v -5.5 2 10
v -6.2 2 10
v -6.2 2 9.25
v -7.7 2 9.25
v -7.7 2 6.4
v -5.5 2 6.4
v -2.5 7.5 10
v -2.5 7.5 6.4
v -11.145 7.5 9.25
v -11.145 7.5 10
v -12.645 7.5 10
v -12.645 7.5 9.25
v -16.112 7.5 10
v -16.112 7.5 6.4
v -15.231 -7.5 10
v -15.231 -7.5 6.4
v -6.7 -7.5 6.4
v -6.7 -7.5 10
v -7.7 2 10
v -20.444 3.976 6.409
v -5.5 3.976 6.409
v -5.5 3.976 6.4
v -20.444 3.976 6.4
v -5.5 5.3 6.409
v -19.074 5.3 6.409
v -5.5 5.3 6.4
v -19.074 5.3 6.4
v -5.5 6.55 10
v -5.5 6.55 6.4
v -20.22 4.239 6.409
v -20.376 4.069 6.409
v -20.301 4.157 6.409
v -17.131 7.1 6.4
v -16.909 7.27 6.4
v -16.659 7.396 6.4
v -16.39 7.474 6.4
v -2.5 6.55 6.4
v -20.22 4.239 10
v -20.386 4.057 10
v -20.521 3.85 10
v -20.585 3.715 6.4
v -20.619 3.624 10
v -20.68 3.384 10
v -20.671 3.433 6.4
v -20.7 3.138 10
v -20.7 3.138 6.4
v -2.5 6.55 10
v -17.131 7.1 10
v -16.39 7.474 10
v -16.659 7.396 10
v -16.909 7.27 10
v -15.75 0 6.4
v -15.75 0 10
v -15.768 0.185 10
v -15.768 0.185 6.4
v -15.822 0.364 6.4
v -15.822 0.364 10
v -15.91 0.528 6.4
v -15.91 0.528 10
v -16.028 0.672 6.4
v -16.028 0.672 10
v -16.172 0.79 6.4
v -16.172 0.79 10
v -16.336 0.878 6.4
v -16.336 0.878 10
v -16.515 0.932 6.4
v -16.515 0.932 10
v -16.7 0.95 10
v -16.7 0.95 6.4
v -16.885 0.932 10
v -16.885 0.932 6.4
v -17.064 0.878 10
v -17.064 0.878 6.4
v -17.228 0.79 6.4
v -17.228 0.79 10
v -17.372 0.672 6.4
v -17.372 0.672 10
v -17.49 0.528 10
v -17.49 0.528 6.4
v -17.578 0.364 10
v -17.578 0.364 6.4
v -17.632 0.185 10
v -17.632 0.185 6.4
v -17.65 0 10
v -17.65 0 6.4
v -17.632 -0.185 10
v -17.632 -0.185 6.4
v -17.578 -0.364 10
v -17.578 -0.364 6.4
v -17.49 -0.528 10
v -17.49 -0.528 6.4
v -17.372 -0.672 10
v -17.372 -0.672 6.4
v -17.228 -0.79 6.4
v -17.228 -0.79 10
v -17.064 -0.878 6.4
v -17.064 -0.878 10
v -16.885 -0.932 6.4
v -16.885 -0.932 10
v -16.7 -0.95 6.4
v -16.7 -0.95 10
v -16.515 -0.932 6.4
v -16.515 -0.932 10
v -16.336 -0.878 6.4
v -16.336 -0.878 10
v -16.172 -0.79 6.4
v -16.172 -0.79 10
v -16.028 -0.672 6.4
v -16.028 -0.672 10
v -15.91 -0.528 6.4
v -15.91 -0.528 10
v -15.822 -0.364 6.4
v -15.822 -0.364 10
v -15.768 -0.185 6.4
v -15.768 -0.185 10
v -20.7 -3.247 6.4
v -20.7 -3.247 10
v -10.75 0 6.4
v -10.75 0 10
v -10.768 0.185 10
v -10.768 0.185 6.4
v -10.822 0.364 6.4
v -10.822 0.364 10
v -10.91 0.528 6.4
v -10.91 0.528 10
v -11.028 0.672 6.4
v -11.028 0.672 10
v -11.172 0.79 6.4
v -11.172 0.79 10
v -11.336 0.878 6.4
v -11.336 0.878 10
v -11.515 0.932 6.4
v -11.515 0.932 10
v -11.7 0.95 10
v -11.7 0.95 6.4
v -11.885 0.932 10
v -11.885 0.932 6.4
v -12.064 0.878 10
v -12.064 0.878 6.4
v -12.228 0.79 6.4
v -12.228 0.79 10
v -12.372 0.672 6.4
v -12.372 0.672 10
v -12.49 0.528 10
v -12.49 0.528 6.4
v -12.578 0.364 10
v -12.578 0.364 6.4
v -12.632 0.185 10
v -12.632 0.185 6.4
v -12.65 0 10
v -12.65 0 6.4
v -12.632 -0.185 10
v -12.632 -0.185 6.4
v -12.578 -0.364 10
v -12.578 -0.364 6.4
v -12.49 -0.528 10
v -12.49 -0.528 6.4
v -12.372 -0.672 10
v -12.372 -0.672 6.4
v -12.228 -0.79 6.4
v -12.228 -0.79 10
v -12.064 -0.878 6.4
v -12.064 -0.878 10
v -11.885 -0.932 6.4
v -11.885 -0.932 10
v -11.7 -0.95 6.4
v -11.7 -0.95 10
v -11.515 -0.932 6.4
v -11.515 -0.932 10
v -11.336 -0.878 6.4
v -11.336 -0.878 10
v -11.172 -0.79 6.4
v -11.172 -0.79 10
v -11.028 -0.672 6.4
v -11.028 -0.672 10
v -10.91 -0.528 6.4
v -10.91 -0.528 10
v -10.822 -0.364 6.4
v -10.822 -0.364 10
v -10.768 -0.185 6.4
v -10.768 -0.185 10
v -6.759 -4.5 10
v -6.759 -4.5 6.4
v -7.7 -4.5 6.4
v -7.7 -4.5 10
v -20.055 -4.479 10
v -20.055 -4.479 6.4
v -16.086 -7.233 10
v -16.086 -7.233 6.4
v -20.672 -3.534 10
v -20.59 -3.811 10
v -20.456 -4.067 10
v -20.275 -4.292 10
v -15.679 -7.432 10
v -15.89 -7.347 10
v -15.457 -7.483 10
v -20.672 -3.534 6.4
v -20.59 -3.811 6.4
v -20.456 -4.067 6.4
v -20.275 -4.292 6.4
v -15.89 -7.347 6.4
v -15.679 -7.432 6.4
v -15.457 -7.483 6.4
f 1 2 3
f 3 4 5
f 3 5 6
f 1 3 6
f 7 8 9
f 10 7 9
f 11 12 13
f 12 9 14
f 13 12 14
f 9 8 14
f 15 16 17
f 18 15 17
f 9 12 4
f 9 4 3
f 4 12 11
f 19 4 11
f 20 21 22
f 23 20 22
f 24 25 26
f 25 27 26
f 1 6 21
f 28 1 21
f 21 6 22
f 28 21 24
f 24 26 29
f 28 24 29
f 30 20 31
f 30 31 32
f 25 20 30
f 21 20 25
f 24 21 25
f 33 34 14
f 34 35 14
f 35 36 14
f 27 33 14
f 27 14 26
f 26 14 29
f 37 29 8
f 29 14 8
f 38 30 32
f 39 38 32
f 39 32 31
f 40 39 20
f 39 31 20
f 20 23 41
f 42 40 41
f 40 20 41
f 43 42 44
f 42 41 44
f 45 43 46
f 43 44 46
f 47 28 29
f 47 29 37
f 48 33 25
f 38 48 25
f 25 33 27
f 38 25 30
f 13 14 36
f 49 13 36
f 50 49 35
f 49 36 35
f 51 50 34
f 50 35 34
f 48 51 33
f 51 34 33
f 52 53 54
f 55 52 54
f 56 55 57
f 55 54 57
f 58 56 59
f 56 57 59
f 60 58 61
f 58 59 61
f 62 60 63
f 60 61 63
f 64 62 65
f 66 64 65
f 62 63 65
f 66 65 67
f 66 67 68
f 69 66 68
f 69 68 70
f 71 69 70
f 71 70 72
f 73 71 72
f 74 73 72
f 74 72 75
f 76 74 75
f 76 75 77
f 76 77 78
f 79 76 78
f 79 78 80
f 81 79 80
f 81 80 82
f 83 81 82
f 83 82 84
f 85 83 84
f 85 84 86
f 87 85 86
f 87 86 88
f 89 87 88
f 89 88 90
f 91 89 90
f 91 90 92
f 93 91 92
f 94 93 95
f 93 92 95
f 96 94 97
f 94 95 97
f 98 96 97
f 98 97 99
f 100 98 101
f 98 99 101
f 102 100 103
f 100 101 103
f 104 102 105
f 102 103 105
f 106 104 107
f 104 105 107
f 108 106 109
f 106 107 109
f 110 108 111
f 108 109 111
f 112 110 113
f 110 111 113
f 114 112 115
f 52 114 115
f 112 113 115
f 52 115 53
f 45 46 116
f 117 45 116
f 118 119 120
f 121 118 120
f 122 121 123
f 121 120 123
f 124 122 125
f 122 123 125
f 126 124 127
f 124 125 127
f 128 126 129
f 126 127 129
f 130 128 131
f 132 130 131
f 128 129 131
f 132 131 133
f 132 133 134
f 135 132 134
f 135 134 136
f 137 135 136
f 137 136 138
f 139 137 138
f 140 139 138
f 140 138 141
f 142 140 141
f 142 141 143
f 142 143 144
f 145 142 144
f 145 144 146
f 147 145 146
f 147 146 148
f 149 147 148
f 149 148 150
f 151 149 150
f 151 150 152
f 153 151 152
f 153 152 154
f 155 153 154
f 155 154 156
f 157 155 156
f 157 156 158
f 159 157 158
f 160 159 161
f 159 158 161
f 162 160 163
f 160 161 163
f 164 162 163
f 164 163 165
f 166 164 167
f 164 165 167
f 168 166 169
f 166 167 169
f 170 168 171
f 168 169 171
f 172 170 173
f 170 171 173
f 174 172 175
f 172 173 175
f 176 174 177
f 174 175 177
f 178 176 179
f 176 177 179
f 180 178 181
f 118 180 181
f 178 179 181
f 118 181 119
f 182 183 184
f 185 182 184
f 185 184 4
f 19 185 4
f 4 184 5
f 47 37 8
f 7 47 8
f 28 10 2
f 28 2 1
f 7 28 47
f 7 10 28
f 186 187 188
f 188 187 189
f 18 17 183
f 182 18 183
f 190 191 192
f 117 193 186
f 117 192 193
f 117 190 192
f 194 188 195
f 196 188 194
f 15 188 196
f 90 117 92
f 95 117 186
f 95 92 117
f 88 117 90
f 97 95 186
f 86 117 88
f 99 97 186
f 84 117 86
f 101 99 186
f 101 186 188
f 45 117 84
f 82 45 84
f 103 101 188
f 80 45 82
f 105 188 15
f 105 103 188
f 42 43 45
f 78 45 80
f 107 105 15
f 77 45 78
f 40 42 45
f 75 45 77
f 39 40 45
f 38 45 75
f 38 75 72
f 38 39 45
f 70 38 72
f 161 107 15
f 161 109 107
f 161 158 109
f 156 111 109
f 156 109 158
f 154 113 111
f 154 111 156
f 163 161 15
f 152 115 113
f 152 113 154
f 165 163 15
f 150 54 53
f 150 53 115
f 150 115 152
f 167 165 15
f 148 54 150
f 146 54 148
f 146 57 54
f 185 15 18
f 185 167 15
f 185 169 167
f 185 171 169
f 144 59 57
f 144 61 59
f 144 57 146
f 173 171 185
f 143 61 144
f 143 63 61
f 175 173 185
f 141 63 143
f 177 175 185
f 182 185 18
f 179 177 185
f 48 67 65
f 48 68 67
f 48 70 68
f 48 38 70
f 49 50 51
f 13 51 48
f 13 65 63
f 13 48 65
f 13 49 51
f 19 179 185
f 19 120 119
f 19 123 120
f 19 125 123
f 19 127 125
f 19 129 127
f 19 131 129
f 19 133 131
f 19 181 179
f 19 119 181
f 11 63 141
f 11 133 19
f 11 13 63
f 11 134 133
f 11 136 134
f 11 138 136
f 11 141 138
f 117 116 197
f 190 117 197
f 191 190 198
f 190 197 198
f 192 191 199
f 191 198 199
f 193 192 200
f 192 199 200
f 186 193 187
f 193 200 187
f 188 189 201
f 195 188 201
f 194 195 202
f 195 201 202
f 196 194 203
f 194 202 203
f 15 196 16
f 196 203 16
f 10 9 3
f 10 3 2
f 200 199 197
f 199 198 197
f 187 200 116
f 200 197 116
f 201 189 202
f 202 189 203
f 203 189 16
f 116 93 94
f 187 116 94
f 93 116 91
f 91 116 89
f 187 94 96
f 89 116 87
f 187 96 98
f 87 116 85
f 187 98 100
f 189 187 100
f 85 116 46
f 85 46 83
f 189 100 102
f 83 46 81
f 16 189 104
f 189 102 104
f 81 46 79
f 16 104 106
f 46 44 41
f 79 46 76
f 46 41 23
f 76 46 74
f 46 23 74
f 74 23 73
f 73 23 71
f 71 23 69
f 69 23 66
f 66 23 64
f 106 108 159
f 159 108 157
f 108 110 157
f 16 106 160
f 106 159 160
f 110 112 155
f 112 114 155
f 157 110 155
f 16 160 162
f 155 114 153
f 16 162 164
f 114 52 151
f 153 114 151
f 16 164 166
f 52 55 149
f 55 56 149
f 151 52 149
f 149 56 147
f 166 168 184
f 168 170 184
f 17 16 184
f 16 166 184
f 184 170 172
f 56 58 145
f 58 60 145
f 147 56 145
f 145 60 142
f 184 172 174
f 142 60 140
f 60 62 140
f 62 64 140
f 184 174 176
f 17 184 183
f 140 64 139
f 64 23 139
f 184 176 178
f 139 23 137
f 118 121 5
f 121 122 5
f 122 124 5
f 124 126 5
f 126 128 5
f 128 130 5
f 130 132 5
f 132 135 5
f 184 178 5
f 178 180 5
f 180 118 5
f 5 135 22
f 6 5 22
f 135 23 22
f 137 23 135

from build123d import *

# Parameters (mm, degrees)
BOSS_EXTRUDE1_DEPTH = 2
BOSS_EXTRUDE2_DEPTH = 8
SKETCH24_R          = 3.9
BOSS_EXTRUDE5_DEPTH = 4.4
SKETCH30_W          = 4.40861202
SKETCH30_H          = 1.324178481
CUT_EXTRUDE12_DEPTH = 16
CUT_EXTRUDE11_DEPTH = 23.928148639
FILLET1_R           = 1.5
SKETCH34_W          = 1.5
SKETCH34_H          = 1.5
CUT_EXTRUDE13_DEPTH = 8
SKETCH36_R          = 0.95
CUT_EXTRUDE15_DEPTH = 8
SKETCH37_R          = 2
CUT_EXTRUDE16_DEPTH = 4.5
SKETCH38_W          = 3
SKETCH38_H          = 1.25
CUT_EXTRUDE17_DEPTH = 3.6


with BuildPart() as part:
    # Sketch2 → Boss-Extrude1 (new body)
    with BuildSketch(Plane.XY):
        with BuildLine():
            Line((-2.5, 7.5), (-16.7, 7.5))
            Line((-16.7, 7.5), (-20.7, 3.793442666))
            Line((-20.7, 3.793442666), (-20.7, -4.031648778))
            Line((-20.7, -4.031648778), (-15.7, -7.5))
            Line((-15.7, -7.5), (-6.7, -7.5))
            Line((-6.7, -7.5), (-4.2, -5.6))
            ThreePointArc((-4.2, -5.6), (3.130495168, -6.260990337), (7, 0))
            ThreePointArc((7, 0), (4.949747468, 4.949747468), (0, 7))
            Line((0, 7), (0, 7.5))
            Line((0, 7.5), (-2.5, 7.5))
        make_face()
    extrude(amount=BOSS_EXTRUDE1_DEPTH)

    # Sketch4 → Boss-Extrude2 (add)
    with BuildSketch(Plane.XY.offset(2)):
        Polygon((-15.7, -7.5), (-6.7, -7.5), (-6.759079174, -4.5), (-7.7, -4.5), (-7.7, 2), (-5.5, 2), (-5.5, 5.3), (-2.5, 5.3), (-2.5, 7.5), (-16.7, 7.5), (-20.7, 3.793442666), (-20.7, -4.031648778), align=None)
    extrude(amount=BOSS_EXTRUDE2_DEPTH)

    # Sketch24 → Boss-Extrude5 (add)
    with BuildSketch(Plane.XY.offset(2)):
        Circle(SKETCH24_R)
    extrude(amount=BOSS_EXTRUDE5_DEPTH)

    # Sketch30 → Cut-Extrude12 (cut)
    with BuildSketch(Plane(origin=(-5.5, 0, 0), x_dir=(0, 0, -1), z_dir=(1, 0, 0))):
        with Locations((-4.20430601, 4.63791076)):
            Rectangle(SKETCH30_W, SKETCH30_H)
    extrude(amount=-CUT_EXTRUDE12_DEPTH, mode=Mode.SUBTRACT)

    # Sketch28 → Cut-Extrude11 (cut, through all)
    with BuildSketch(Plane.XY.offset(6.4)):
        with BuildLine():
            Line((-1, 0.979795897), (-1, -0.979795897))
            ThreePointArc((-1, -0.979795897), (1.4, 0), (-1, 0.979795897))
        make_face()
    extrude(amount=-CUT_EXTRUDE11_DEPTH, mode=Mode.SUBTRACT)

    # Fillet1
    # the kernel refuses this fillet: 1.5 mm, written as the material it takes off along each edge
    with BuildSketch(Plane(origin=(-15.230677435, -6, 1.5), x_dir=(-0.5699665637840448, -0.8216678867816415, 0), z_dir=(0, 0, -1))) as fillet1_piece_1_section:
        Polygon((0, 0), (FILLET1_R * 1.02, 0), (FILLET1_R * 1.02, -FILLET1_R * 0.319139344377), (FILLET1_R * 0.838101244517, -FILLET1_R * 0.58136589506), align=None)
    fillet1_piece_1 = extrude(amount=FILLET1_R * 1.02, mode=Mode.PRIVATE)
    fillet1_piece_1 = fillet1_piece_1 - Plane(origin=(-15.230677435, -6, 1.5), x_dir=(0.29860685961507855, 0.9543762064253388, 0), z_dir=(0, 0, -1)) * Sphere(FILLET1_R, mode=Mode.PRIVATE)
    add(fillet1_piece_1, mode=Mode.SUBTRACT)
    with BuildSketch(Plane(origin=(-16.11186344, 6, 1.5), x_dir=(-0.6796897201843015, 0.7334997506991983, 0), z_dir=(0, 0, -1))) as fillet1_piece_2_section:
        Polygon((0, 0), (FILLET1_R * 1.02, 0), (FILLET1_R * 1.02, FILLET1_R * 0.399932860855), (FILLET1_R * 0.748169745713, FILLET1_R * 0.693283514588), align=None)
    fillet1_piece_2 = extrude(amount=FILLET1_R * 1.02, mode=Mode.PRIVATE)
    fillet1_piece_2 = fillet1_piece_2 - Plane(origin=(-16.11186344, 6, 1.5), x_dir=(0.3650344157067945, -0.9309940254102596, 0), z_dir=(0, 0, -1)) * Sphere(FILLET1_R, mode=Mode.PRIVATE)
    add(fillet1_piece_2, mode=Mode.SUBTRACT)
    with BuildSketch(Plane(origin=(-19.2, 3.138411196, 1.5), x_dir=(-0.6796897201843015, 0.7334997506991983, 0), z_dir=(0, 0, -1))) as fillet1_piece_3_section:
        Polygon((0, 0), (FILLET1_R * 1.02, 0), (FILLET1_R * 1.02, -FILLET1_R * 0.445421399395), (FILLET1_R * 0.693283514588, -FILLET1_R * 0.748169745713), align=None)
    fillet1_piece_3 = extrude(amount=FILLET1_R * 1.02, mode=Mode.PRIVATE)
    fillet1_piece_3 = fillet1_piece_3 - Plane(origin=(-19.2, 3.138411196, 1.5), x_dir=(0.9164304993244992, -0.40019387789901173, 0), z_dir=(0, 0, -1)) * Sphere(FILLET1_R, mode=Mode.PRIVATE)
    add(fillet1_piece_3, mode=Mode.SUBTRACT)
    with BuildSketch(Plane(origin=(-19.2, -3.246599046, 1.5), x_dir=(-0.5699665637840448, -0.8216678867816415, 0), z_dir=(0, 0, -1))) as fillet1_piece_4_section:
        Polygon((0, 0), (FILLET1_R * 1.02, 0), (FILLET1_R * 1.02, FILLET1_R * 0.533833817771), (FILLET1_R * 0.58136589506, FILLET1_R * 0.838101244517), align=None)
    fillet1_piece_4 = extrude(amount=FILLET1_R * 1.02, mode=Mode.PRIVATE)
    fillet1_piece_4 = fillet1_piece_4 - Plane(origin=(-19.2, -3.246599046, 1.5), x_dir=(0.8859928227090906, 0.46369895202380795, 0), z_dir=(0, 0, -1)) * Sphere(FILLET1_R, mode=Mode.PRIVATE)
    add(fillet1_piece_4, mode=Mode.SUBTRACT)
    with BuildSketch(Plane(origin=(-15.230677435, -7.5, 0), x_dir=(0, 1, 0), z_dir=(1, 0, 0))) as fillet1_piece_5_section:
        with BuildLine():
            CenterArc((FILLET1_R, FILLET1_R), FILLET1_R, 180, 90)
            Line((0, FILLET1_R), (0, 0))
            Line((0, 0), (FILLET1_R, 0))
        make_face()
    fillet1_piece_5 = extrude(amount=12.280677435, mode=Mode.PRIVATE)
    fillet1_piece_5 = split(fillet1_piece_5, bisect_by=Plane(origin=(-9.092127217, -9.318016685, 0.3282266), z_dir=(-0.6050832675335577, 0.7961621941231027, 0)), keep=Keep.TOP, mode=Mode.PRIVATE)
    add(fillet1_piece_5, mode=Mode.SUBTRACT)
    with BuildSketch(Plane(origin=(3.75, 7.5, 0), x_dir=(0, 0, 1), z_dir=(-1, 0, 0))) as fillet1_piece_6:
        with BuildLine():
            CenterArc((FILLET1_R, -FILLET1_R), FILLET1_R, 90, 90)
            Line((0, -FILLET1_R), (0, 0))
            Line((0, 0), (FILLET1_R, 0))
        make_face()
    extrude(amount=19.86186344, mode=Mode.SUBTRACT)
    with BuildSketch(Plane(origin=(-17.13139802, 7.100249626, 0), x_dir=(0.6796897201843014, -0.7334997506991981, 0), z_dir=(-0.7334997506991983, -0.6796897201843015, 0))) as fillet1_piece_7:
        with BuildLine():
            CenterArc((FILLET1_R, FILLET1_R), FILLET1_R, 180, 90)
            Line((0, FILLET1_R), (0, 0))
            Line((0, 0), (FILLET1_R, 0))
        make_face()
    extrude(amount=4.21013989, mode=Mode.SUBTRACT)
    with BuildSketch(Plane(origin=(-20.054949846, -4.479100876, 0), x_dir=(0.5699665637840448, 0.8216678867816416, 0), z_dir=(0.8216678867816415, -0.5699665637840448, 0))) as fillet1_piece_8:
        with BuildLine():
            CenterArc((FILLET1_R, FILLET1_R), FILLET1_R, 180, 90)
            Line((0, FILLET1_R), (0, 0))
            Line((0, 0), (FILLET1_R, 0))
        make_face()
    extrude(amount=4.830811364, mode=Mode.SUBTRACT)
    with BuildSketch(Plane(origin=(-20.7, 3.138411196, 0), x_dir=(1, 0, 0), z_dir=(0, -1, 0))) as fillet1_piece_9:
        with BuildLine():
            CenterArc((FILLET1_R, FILLET1_R), FILLET1_R, 180, 90)
            Line((0, FILLET1_R), (0, 0))
            Line((0, 0), (FILLET1_R, 0))
        make_face()
    extrude(amount=6.385010242, mode=Mode.SUBTRACT)
    with BuildSketch(Plane(origin=(-15.7, -7.5, 1.5), x_dir=(1, 0, 0), z_dir=(0, 0, 1))) as fillet1_piece_10:
        with BuildLine():
            CenterArc((FILLET1_R * 0.312881710173, FILLET1_R), FILLET1_R, 235.252105822, 34.747894178)
            Line((-FILLET1_R * 0.257084853611, FILLET1_R * 0.178332113218), (0, 0))
            Line((0, 0), (FILLET1_R * 0.312881710173, 0))
        make_face()
    extrude(amount=9.673306413, mode=Mode.SUBTRACT)
    with BuildSketch(Plane(origin=(-20.7, -4.031648778, 1.5), x_dir=(0, 1, 0), z_dir=(0, 0, 1))) as fillet1_piece_11:
        with BuildLine():
            CenterArc((FILLET1_R * 0.523366488011, -FILLET1_R), FILLET1_R, 90, 55.252105822)
            Line((-FILLET1_R * 0.298301398771, -FILLET1_R * 0.430033436216), (0, 0))
            Line((0, 0), (FILLET1_R * 0.523366488011, 0))
        make_face()
    extrude(amount=10.46262433, mode=Mode.SUBTRACT)
    with BuildSketch(Plane(origin=(-20.7, 3.793442666, 1.5), x_dir=(0.7334997506991984, 0.6796897201843014, 0), z_dir=(0, 0, 1))) as fillet1_piece_12:
        with BuildLine():
            CenterArc((FILLET1_R * 0.436687646465, -FILLET1_R), FILLET1_R, 90, 47.18059856)
            Line((-FILLET1_R * 0.296812104234, -FILLET1_R * 0.320310279816), (0, 0))
            Line((0, 0), (FILLET1_R * 0.436687646465, 0))
        make_face()
    extrude(amount=10.137578674, mode=Mode.SUBTRACT)
    with BuildSketch(Plane(origin=(-16.7, 7.5, 1.5), x_dir=(1, 0, 0), z_dir=(0, 0, 1))) as fillet1_piece_13:
        with BuildLine():
            CenterArc((FILLET1_R * 0.392091040054, -FILLET1_R), FILLET1_R, 90, 42.81940144)
            Line((-FILLET1_R * 0.287598680131, -FILLET1_R * 0.266500249301), (0, 0))
            Line((0, 0), (FILLET1_R * 0.392091040054, 0))
        make_face()
    extrude(amount=9.9703414, mode=Mode.SUBTRACT)

    # Sketch34 → Cut-Extrude13 (cut, along a direction that is not the sketch's normal)
    with BuildSketch(Plane.XZ.offset(-2)):
        with Locations((-6.95, 10)):
            Rectangle(SKETCH34_W, SKETCH34_H)
    extrude(amount=-CUT_EXTRUDE13_DEPTH, dir=(0.6685833876565112, -0.7436371788377336, 0), mode=Mode.SUBTRACT)

    # Sketch36 → Cut-Extrude15 (cut)
    with BuildSketch(Plane.XY.offset(10)):
        with Locations((-11.7, 0)):
            Circle(SKETCH36_R)
        with Locations((-16.7, 0)):
            Circle(SKETCH36_R)
    extrude(amount=-CUT_EXTRUDE15_DEPTH, mode=Mode.SUBTRACT)

    # Sketch37 → Cut-Extrude16 (cut)
    with BuildSketch(Plane(origin=(0, 0, 0), x_dir=(-1, 0, 0), z_dir=(0, 0, -1))):
        with Locations((11.7, 0)):
            Circle(SKETCH37_R)
        with Locations((16.7, 0)):
            Circle(SKETCH37_R)
    extrude(amount=-CUT_EXTRUDE16_DEPTH, mode=Mode.SUBTRACT)

    # Sketch38 → Cut-Extrude17 (cut)
    with BuildSketch(Plane.XY.offset(10)):
        with Locations((-4, 5.925)):
            Rectangle(SKETCH38_W, SKETCH38_H)
    extrude(amount=-CUT_EXTRUDE17_DEPTH, mode=Mode.SUBTRACT)


with BuildPart() as body_2:
    # Split1: the piece on the far side of the plane
    add(part.part)
    split(bisect_by=Plane.XY.offset(6.4), keep=Keep.BOTTOM)


with BuildPart() as part_1:
    add(part.part)

    # Split1
    split(bisect_by=Plane.XY.offset(6.4), keep=Keep.TOP)


solid = part_1.part
